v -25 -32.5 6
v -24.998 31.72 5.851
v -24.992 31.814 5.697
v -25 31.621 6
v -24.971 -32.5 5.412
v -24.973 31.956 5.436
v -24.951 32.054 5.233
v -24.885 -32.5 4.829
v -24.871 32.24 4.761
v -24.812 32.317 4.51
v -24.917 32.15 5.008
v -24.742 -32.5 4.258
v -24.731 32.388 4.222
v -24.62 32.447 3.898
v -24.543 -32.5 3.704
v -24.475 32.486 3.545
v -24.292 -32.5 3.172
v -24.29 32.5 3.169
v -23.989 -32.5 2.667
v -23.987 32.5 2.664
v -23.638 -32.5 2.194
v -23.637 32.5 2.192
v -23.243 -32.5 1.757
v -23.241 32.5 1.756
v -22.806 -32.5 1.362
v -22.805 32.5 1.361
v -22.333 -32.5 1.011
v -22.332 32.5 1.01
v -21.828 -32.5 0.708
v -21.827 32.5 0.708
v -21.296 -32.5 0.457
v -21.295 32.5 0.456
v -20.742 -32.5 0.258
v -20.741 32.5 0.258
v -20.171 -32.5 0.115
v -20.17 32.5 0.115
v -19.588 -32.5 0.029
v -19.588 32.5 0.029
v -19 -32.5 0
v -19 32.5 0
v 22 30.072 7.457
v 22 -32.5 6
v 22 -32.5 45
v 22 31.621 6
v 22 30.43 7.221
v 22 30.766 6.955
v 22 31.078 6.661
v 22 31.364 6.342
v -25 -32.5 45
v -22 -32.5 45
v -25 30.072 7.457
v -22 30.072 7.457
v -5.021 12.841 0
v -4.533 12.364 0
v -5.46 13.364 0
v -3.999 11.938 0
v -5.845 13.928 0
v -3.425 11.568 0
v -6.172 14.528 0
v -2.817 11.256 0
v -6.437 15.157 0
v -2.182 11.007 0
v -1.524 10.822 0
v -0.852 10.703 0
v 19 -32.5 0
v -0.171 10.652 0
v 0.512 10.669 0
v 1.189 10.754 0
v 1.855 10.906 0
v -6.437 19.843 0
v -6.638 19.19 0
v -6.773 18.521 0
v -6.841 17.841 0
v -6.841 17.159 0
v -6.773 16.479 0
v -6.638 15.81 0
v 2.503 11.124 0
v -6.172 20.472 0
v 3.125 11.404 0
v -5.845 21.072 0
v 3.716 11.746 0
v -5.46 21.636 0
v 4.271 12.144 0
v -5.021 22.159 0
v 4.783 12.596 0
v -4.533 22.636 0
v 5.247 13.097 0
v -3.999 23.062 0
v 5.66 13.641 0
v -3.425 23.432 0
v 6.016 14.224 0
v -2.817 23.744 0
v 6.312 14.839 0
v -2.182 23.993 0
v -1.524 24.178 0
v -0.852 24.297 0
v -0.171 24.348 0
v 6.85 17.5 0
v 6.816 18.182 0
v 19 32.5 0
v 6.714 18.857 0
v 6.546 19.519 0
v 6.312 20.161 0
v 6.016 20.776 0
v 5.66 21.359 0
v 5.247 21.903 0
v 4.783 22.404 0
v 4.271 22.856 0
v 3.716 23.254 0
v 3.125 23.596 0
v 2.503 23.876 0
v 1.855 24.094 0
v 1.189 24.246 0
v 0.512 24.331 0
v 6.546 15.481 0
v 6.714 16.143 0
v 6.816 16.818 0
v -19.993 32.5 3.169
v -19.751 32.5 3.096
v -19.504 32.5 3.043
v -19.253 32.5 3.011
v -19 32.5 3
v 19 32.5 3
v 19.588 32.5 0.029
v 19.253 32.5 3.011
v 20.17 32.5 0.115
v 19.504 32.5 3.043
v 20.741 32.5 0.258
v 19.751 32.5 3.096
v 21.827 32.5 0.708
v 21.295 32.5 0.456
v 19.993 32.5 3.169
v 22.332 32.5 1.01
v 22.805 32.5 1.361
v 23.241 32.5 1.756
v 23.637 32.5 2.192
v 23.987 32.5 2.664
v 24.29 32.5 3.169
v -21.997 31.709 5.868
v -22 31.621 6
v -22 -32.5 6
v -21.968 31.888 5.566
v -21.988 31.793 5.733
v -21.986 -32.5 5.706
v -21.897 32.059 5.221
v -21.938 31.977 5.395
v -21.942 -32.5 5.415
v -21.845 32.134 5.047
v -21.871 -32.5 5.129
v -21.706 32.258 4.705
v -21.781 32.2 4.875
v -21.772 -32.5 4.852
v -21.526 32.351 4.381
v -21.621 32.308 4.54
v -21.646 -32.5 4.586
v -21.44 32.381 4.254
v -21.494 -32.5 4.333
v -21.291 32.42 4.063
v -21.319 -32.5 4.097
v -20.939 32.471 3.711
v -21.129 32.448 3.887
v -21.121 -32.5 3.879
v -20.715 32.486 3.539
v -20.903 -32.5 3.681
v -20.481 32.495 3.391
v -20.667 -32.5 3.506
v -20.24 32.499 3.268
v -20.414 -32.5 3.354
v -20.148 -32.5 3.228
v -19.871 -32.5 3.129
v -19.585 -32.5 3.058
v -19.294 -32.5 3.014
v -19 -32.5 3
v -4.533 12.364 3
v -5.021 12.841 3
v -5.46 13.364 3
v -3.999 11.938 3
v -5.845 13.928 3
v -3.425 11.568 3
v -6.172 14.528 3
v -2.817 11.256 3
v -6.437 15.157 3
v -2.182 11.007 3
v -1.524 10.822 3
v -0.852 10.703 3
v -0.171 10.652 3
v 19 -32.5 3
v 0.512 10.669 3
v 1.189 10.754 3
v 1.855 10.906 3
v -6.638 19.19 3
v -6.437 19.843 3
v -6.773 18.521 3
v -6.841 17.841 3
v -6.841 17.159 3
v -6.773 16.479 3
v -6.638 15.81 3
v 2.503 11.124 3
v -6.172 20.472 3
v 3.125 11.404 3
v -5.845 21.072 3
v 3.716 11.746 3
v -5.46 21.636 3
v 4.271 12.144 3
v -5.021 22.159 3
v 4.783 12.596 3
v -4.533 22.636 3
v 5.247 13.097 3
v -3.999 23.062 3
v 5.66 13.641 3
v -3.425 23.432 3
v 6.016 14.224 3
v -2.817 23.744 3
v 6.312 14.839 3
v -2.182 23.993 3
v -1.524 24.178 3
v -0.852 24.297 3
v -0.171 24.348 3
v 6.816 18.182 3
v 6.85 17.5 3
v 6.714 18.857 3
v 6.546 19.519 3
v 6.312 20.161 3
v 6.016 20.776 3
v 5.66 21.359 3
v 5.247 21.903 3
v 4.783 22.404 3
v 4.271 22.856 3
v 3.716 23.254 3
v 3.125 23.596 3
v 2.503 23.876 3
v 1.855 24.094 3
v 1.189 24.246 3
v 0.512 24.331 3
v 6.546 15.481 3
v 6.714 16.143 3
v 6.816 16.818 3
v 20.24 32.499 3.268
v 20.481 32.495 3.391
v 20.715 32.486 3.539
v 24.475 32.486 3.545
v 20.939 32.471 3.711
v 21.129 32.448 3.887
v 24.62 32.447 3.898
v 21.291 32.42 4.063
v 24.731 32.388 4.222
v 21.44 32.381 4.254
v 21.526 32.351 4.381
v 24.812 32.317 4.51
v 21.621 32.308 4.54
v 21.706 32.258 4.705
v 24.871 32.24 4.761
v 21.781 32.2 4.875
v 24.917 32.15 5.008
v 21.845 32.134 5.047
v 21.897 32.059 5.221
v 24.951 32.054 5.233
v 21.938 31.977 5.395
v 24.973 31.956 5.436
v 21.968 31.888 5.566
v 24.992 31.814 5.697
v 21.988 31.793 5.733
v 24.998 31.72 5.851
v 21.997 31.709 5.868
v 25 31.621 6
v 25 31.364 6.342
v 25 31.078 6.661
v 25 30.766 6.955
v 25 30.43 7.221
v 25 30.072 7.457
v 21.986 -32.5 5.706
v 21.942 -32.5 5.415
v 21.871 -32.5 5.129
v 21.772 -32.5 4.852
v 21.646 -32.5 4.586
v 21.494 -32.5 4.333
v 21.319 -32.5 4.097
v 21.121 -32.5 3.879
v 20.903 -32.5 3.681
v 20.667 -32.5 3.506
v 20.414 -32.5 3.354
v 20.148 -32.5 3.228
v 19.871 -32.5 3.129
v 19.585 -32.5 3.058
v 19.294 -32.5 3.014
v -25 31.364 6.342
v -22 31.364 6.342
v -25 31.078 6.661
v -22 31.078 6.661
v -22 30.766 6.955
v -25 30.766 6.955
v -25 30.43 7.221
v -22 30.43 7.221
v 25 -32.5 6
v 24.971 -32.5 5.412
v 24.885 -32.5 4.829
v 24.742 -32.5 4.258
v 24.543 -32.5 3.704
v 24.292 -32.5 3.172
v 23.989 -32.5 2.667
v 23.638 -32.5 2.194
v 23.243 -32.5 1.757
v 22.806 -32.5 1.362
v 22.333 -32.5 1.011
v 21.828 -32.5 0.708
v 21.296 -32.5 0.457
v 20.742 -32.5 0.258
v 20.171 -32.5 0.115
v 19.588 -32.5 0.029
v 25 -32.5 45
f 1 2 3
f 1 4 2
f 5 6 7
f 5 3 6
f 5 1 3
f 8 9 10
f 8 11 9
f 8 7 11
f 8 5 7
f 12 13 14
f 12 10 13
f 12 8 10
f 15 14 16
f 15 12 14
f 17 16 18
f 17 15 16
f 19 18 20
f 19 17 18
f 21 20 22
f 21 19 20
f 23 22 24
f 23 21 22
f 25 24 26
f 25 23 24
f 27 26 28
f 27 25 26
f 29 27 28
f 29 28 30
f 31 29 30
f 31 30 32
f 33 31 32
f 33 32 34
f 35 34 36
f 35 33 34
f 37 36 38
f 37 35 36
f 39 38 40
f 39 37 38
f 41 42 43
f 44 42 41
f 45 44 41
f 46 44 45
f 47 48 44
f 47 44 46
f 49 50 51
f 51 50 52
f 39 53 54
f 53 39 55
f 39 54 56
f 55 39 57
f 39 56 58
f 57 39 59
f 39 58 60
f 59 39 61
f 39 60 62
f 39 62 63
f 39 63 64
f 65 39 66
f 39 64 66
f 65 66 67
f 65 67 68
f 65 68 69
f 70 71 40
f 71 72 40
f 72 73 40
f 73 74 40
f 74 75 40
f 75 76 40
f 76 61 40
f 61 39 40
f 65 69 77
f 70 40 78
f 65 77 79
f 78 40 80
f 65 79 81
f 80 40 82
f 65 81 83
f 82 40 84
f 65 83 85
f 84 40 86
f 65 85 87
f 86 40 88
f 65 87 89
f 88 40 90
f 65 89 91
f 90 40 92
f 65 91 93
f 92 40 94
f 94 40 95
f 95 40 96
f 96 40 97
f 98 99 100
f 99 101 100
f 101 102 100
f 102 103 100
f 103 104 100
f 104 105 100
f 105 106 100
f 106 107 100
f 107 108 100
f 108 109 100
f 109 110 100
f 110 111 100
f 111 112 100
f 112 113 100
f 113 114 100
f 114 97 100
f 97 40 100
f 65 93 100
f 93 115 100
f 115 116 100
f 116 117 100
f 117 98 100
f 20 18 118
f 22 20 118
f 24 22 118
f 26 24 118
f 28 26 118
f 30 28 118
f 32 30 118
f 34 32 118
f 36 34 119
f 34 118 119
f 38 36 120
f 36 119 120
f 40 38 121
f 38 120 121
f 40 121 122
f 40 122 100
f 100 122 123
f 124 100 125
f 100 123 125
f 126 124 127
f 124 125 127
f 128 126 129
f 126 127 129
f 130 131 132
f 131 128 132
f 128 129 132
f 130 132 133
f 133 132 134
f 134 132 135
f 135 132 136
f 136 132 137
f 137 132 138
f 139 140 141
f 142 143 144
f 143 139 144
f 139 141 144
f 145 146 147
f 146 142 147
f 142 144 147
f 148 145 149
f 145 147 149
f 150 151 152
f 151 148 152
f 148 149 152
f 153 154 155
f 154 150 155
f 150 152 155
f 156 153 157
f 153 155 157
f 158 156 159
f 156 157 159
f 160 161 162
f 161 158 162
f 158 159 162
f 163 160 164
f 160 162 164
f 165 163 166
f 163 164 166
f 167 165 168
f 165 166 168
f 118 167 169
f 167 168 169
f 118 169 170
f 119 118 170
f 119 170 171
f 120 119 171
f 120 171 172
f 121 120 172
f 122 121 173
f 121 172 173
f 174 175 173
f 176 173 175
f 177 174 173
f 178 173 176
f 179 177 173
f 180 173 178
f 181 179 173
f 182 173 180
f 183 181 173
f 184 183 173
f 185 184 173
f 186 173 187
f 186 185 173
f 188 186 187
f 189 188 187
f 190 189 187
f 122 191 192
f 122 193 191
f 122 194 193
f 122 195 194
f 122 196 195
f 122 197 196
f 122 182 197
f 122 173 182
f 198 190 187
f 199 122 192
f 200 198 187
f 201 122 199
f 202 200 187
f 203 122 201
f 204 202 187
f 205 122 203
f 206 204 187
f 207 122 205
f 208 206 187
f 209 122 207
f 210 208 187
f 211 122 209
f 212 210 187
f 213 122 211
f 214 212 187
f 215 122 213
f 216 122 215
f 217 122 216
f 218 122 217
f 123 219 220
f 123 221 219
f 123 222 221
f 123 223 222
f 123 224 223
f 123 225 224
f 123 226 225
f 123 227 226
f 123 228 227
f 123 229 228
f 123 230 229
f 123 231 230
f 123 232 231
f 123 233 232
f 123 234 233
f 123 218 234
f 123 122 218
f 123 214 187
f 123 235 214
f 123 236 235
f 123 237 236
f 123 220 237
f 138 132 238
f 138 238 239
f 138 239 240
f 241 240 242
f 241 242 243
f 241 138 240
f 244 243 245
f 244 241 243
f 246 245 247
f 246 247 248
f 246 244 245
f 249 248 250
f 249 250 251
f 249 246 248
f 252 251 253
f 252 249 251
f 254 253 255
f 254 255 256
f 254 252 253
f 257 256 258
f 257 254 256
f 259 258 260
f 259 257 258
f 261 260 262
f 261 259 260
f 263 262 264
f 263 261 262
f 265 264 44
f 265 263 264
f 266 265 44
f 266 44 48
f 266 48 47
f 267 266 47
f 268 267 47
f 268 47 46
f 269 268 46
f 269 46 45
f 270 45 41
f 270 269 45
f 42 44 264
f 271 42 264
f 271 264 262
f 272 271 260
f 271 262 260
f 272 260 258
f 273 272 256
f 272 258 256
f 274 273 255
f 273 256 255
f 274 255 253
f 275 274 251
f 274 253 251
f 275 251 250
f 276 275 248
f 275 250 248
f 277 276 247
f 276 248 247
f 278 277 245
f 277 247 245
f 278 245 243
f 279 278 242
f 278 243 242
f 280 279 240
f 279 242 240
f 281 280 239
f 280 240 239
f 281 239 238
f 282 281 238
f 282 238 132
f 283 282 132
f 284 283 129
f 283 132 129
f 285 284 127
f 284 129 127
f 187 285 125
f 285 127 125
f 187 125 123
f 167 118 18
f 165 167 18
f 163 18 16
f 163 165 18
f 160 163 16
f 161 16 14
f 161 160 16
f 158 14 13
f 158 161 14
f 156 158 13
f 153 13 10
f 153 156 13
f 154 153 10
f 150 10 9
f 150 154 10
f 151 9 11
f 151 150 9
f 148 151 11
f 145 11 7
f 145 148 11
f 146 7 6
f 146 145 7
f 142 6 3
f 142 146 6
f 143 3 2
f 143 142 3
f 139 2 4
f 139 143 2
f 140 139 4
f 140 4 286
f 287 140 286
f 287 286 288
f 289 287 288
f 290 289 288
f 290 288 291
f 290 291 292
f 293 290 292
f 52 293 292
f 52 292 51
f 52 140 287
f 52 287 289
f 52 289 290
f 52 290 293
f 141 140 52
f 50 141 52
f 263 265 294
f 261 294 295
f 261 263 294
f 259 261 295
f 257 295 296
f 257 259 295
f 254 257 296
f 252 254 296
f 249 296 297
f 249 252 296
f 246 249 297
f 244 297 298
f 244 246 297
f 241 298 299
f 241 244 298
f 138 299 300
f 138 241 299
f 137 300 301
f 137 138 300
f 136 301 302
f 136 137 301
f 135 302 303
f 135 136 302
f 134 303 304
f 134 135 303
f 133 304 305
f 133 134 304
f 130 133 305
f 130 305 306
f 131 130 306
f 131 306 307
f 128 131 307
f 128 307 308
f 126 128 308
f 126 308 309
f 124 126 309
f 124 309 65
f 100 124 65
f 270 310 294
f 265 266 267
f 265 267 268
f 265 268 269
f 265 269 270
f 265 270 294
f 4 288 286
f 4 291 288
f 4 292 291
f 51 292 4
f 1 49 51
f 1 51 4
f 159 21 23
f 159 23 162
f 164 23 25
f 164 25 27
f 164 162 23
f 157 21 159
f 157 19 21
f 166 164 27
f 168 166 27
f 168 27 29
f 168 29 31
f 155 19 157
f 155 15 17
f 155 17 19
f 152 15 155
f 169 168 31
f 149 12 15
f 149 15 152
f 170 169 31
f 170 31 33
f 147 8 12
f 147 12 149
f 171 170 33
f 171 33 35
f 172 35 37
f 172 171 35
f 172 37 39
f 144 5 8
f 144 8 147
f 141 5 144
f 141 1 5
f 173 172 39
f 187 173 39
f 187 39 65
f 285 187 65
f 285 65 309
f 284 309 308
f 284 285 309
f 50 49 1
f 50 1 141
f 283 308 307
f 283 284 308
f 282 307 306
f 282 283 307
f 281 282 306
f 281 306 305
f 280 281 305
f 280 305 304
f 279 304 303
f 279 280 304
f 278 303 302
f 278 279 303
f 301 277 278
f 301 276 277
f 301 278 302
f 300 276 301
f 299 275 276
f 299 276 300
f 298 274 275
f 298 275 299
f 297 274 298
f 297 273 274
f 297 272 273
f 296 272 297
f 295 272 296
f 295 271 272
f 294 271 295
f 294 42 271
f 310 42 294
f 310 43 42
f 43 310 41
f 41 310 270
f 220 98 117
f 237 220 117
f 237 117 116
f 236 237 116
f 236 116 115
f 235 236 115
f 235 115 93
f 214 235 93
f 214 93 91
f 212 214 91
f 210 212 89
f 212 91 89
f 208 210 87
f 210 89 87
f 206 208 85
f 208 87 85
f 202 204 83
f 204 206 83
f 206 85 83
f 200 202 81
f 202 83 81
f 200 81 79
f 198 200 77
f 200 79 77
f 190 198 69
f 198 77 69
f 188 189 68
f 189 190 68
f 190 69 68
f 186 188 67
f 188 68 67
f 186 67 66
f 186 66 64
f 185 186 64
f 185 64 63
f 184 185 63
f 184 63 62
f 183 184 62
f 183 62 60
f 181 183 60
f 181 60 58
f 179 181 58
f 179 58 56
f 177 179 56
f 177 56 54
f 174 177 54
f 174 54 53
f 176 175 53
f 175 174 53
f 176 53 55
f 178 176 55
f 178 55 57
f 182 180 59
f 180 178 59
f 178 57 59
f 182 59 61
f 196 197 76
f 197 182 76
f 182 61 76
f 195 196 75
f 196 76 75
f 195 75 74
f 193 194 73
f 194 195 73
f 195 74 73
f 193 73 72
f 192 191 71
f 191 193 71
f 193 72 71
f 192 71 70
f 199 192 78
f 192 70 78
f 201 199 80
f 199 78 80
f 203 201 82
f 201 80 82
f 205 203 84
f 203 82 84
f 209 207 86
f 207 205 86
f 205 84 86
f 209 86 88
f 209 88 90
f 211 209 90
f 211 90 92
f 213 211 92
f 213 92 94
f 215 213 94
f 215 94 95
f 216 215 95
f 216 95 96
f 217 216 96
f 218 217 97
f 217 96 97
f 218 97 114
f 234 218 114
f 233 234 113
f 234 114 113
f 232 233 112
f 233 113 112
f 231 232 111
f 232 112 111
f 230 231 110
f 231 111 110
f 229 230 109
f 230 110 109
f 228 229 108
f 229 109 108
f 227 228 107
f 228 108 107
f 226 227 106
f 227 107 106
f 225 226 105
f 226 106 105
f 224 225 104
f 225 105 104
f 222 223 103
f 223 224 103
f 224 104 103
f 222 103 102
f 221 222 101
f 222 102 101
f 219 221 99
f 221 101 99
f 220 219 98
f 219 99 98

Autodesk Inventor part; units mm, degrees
ref_plane "YZ Plane" through (0, 0, 0) normal (1, 0, 0) x (0, 1, 0)
ref_plane "XZ Plane" through (0, 0, 0) normal (0, 1, 0) x (-1, 0, 0)
ref_plane "XY Plane" through (0, 0, 0) normal (0, 0, 1) x (1, 0, 0)
sketch "Sketch1" plane through (0, 0, 0) normal (0, 0, 1) x (1, 0, 0)
  line L0 (-25, -32.5) -> (25, -32.5)
  line L1 (25, -32.5) -> (25, 32.5)
  line L2 (25, 32.5) -> (-25, 32.5)
  line L3 (-25, 32.5) -> (-25, -32.5)
  line L4 (-25, -32.5) -> (25, 32.5) construction
  line L5 (25, -32.5) -> (-25, 32.5) construction
  circle A0 centre (0, 17.5) radius 6.85
  point P0 (0, 0)
  dimension "d0" = 50
  dimension "d1" = 13.7
  dimension "d2" = 50
  dimension "d3" = 65
extrude "Plate1" add sketch "Sketch1" along normal blind 3
sketch "Sketch2" plane through (-22, -32.5, 0) normal (-1, 0, 0) x (0, -1, 0)
  line L0 (-65, 0) -> (0, 0)
  line L1 (0, 0) -> (0, 45)
  line L2 (0, 45) -> (-65, 45)
  line L3 (-65, 45) -> (-65, 0)
edge flange "Flange1" height 45 angle 90 thickness 3 bend radius 3 thickness toward (-1, 0, 0) relief tear relief width 3 relief depth 1.5 corner gap 3 corner form 0 edges at (-25, 0, 3) (25, 0, 3) wall of the first edge with corners at (-22, 32.5, 0) (-22, -32.5, 0) (-22, -32.5, 45) (-22, 32.5, 45)
bend "Bend1"
corner "Corner1"
sketch "Sketch3" plane through (25, -32.5, 45) normal (1, 0, 0) x (0, 0, -1)
  line L0 (0, 65) -> (0, 0) projected
  line L1 (0, 0) -> (40.9053, 68.1756)
  line L2 (40.9053, 68.1756) -> (0, 68.1756)
  line L3 (0, 68.1756) -> (0, 0)
  point P0 (45, 32.5)
  point P1 (0, 65)
  point P2 (39, 65)
extrude "Extrusion1" cut sketch "Sketch3" against normal through all
fillet "Fillet1" radius 5 2 edges at (-23.5, 32.5, 6) (23.5, 32.5, 6)
equation "\"d4\" = Thickness"
equation "\"d5\" = BendReliefWidth"
equation "\"d6\" = BendReliefDepth"
equation "\"d7\" = MinimumRemnant"
equation "\"d8\" = TransitionRadius"
equation "\"d11\" = BendRadius"
equation "\"d12\" = CornerReliefSize"
equation "\"d13\" = GapSize"
equation "\"d14\" = JacobiRadiusSize"
equation "\"BendRadius\" = Thickness"
equation "\"BendReliefWidth\" = Thickness"
equation "\"BendReliefDepth\" = 0.5 * Thickness"
equation "\"CornerReliefSize\" = 4 * Thickness"
equation "\"MinimumRemnant\" = 2 * Thickness"
equation "\"TransitionRadius\" = BendRadius"
equation "\"JacobiRadiusSize\" = BendRadius"
equation "\"GapSize\" = Thickness"
equation "\"Thickness\" = 3"
properties part number "Soporte Fijo"
